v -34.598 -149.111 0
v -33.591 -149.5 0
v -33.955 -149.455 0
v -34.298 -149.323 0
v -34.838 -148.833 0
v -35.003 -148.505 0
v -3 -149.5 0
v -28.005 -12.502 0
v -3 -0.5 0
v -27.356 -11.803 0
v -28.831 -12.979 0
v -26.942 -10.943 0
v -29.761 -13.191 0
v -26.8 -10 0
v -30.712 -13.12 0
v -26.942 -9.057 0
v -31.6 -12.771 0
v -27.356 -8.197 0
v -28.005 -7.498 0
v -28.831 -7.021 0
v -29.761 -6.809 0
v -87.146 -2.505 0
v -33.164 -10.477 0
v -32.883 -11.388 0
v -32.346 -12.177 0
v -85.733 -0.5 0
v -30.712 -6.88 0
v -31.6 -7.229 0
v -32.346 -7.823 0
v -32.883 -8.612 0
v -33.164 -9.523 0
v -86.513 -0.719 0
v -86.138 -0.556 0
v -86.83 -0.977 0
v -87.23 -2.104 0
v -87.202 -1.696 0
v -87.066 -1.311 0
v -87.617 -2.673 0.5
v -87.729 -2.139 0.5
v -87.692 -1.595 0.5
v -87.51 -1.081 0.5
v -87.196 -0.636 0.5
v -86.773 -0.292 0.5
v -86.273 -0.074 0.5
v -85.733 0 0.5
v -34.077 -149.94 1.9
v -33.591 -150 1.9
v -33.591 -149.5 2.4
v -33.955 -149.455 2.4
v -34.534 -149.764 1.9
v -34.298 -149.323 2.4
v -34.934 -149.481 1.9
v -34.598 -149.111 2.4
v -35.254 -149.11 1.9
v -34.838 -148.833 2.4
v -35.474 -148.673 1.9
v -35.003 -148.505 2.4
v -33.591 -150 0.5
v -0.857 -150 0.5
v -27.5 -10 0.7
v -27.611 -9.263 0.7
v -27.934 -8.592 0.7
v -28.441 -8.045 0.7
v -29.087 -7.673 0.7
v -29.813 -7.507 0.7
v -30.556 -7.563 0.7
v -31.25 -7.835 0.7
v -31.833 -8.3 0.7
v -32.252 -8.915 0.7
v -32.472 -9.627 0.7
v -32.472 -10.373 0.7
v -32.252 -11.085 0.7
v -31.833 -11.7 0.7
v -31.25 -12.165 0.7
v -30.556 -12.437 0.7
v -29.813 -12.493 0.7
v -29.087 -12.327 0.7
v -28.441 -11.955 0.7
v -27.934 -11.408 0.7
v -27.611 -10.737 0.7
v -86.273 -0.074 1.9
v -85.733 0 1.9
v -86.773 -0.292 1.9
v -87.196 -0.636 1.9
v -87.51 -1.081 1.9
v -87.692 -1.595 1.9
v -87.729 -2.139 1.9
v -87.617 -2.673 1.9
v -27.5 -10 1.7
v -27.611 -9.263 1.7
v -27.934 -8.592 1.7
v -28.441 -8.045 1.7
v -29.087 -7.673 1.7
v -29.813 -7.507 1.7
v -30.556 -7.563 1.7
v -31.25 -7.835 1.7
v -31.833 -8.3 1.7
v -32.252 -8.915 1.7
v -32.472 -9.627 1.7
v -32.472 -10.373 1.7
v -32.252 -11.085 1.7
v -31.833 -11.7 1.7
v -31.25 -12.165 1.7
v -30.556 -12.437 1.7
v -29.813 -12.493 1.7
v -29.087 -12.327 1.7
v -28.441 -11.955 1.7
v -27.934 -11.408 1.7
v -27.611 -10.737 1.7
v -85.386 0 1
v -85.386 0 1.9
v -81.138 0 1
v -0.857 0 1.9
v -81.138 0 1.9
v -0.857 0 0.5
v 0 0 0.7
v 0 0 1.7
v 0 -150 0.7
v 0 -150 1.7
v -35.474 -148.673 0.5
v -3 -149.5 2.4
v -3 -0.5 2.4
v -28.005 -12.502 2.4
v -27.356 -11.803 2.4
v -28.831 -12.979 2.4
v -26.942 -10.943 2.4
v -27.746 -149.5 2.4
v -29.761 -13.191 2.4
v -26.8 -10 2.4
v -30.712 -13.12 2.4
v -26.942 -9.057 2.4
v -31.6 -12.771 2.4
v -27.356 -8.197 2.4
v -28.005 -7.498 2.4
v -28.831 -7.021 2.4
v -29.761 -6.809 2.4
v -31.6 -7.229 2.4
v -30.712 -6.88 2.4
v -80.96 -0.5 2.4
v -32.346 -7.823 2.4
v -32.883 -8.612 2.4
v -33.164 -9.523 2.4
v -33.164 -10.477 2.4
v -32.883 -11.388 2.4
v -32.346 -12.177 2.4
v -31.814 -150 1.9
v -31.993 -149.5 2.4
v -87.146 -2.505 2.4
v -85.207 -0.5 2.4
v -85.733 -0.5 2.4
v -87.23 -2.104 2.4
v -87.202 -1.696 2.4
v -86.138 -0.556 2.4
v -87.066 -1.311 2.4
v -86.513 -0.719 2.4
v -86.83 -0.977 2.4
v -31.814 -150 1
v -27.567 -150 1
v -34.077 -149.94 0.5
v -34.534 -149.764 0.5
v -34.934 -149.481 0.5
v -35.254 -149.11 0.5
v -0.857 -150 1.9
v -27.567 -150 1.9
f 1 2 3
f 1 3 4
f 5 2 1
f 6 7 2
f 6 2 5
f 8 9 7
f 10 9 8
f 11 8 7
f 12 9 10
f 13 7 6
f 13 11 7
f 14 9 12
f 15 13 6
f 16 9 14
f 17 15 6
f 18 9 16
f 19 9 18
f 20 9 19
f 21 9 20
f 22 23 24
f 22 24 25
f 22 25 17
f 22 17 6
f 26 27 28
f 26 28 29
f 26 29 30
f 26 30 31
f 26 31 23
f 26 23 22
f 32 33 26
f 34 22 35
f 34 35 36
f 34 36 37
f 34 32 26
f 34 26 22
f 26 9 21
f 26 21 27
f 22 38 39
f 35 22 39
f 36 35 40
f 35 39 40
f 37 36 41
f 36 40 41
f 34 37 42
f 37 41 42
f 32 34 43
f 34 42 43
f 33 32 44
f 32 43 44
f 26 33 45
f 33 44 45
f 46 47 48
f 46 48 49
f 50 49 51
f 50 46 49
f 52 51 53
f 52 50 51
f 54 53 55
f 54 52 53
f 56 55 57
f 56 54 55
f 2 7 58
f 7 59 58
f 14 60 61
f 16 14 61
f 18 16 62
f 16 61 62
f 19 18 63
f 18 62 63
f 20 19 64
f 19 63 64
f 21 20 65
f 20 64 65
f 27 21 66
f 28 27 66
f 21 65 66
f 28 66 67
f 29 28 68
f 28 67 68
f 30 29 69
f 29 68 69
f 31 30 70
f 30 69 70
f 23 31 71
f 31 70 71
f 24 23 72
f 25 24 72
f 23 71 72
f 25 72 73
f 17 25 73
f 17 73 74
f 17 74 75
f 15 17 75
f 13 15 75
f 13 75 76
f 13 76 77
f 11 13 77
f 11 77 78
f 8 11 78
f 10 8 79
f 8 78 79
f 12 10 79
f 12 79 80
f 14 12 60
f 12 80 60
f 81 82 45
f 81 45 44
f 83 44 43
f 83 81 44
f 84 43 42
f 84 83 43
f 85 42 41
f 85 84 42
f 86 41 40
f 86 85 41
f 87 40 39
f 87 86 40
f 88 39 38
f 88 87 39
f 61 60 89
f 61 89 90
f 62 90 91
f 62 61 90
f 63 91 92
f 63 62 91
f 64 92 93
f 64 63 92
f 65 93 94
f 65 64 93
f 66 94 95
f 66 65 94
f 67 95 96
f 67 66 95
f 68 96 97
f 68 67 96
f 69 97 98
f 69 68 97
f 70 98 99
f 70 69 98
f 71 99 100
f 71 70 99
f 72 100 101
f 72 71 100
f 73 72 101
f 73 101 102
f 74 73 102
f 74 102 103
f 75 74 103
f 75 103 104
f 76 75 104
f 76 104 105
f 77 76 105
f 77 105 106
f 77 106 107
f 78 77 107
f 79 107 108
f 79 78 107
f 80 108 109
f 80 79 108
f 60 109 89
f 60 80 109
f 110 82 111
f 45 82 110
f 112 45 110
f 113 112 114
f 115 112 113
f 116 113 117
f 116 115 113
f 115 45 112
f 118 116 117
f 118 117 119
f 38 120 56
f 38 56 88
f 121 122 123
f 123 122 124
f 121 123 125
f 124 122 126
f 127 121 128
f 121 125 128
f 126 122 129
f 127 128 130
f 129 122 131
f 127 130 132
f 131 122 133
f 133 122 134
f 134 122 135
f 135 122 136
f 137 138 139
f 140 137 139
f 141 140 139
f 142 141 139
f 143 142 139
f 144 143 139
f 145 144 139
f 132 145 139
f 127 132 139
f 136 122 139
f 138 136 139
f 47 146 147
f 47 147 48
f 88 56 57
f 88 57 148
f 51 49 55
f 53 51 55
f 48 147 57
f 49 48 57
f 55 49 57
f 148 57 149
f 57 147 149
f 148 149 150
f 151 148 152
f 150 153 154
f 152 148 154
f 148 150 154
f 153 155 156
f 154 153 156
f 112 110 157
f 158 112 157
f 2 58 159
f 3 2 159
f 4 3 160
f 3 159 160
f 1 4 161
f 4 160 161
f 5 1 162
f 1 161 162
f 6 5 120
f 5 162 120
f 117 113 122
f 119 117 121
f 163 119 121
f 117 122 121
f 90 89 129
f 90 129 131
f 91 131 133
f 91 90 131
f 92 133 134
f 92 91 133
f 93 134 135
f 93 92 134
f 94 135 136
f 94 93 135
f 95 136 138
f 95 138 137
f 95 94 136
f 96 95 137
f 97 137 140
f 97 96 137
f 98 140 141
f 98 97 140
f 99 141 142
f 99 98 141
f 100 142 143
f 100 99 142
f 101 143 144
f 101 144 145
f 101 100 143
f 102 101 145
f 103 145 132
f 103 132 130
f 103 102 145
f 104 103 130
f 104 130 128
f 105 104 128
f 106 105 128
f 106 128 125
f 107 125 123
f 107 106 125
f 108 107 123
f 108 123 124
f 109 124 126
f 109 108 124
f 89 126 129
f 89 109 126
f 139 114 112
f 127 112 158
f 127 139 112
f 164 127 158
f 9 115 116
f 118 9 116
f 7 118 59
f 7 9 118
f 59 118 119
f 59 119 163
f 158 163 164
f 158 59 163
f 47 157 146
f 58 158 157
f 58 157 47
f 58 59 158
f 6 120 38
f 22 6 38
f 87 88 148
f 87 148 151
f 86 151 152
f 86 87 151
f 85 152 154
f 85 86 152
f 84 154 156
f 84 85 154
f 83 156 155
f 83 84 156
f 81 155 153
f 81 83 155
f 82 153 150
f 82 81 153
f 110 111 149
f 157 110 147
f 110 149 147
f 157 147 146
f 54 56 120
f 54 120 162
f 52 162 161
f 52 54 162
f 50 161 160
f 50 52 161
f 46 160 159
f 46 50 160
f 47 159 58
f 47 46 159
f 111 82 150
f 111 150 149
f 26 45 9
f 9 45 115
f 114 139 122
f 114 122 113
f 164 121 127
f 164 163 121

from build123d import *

# Parameters (mm, degrees)
SKETCH_R         = 2.5
PAD_DEPTH        = 2.4
POCKET_START     = -3
SKETCH001_W      = 171.051082
SKETCH001_H      = 1.4
POCKET_DEPTH     = 4
CHAMFER001_SIZE2 = 3
CHAMFER001_SIZE  = 0.7
CHAMFER002_SIZE2 = 3
CHAMFER002_SIZE  = 0.7
FILLET001_R      = 2
CHAMFER003_SIZE  = 0.5
CHAMFER004_SIZE  = 0.7


with BuildPart() as part:
    # Sketch (on Origin) → Pad (new body)
    with BuildSketch(Plane.XY):
        Polygon((-88.571429, 0), (0, 0), (0, -150), (-35, -150), align=None)
        with Locations((-30, -10)):
            Circle(SKETCH_R, mode=Mode.SUBTRACT)
    extrude(amount=PAD_DEPTH)

    # Sketch001 (on Face4 of Pad) → Pocket (cut)
    with BuildSketch(Plane(origin=(-78.552036, -28.054299, 0), x_dir=(0.336336, -0.941742, 0), z_dir=(-0.941742, -0.336336, 0)).offset(POCKET_START)):
        with Locations((55.735746, 1.7)):
            Rectangle(SKETCH001_W, SKETCH001_H)
    extrude(amount=-POCKET_DEPTH, mode=Mode.SUBTRACT)

    # Chamfer001
    chamfer001_edges = [part.edges().sort_by_distance(p)[0] for p in [
        (0, -75, 2.4),
    ]]
    chamfer001_side = part.faces().sort_by_distance((0, -75, 1.2))[0]
    chamfer(chamfer001_edges, length=CHAMFER001_SIZE, length2=CHAMFER001_SIZE2, reference=chamfer001_side)

    # Chamfer002
    chamfer002_edges = [part.edges().sort_by_distance(p)[0] for p in [
        (0, -75, 0),
    ]]
    chamfer002_side = part.faces().sort_by_distance((0, -75, 0.85))[0]
    chamfer(chamfer002_edges, length=CHAMFER002_SIZE, length2=CHAMFER002_SIZE2, reference=chamfer002_side)

    # Fillet001
    fillet001_edges = [part.edges().sort_by_distance(p)[0] for p in [
        (-35, -150, 1.2),
        (-88.571429, 0, 1.2),
    ]]
    fillet(fillet001_edges, radius=FILLET001_R)

    # Chamfer003
    chamfer003_edges = [part.edges().sort_by_distance(p)[0] for p in [
        (-18.295281, -150, 0),
        (-61.545474, -75.672673, 2.4),
        (-42.069197, 0, 2.4),
        (-15.283483, -150, 2.4),
    ]]
    chamfer(chamfer003_edges, length=CHAMFER003_SIZE)

    # Chamfer004
    chamfer004_edges = [part.edges().sort_by_distance(p)[0] for p in [
        (-27.5, -10, 1.2),
        (-32.5, -10, 0),
        (-32.5, -10, 2.4),
    ]]
    chamfer(chamfer004_edges, length=CHAMFER004_SIZE)


solid = part.part
